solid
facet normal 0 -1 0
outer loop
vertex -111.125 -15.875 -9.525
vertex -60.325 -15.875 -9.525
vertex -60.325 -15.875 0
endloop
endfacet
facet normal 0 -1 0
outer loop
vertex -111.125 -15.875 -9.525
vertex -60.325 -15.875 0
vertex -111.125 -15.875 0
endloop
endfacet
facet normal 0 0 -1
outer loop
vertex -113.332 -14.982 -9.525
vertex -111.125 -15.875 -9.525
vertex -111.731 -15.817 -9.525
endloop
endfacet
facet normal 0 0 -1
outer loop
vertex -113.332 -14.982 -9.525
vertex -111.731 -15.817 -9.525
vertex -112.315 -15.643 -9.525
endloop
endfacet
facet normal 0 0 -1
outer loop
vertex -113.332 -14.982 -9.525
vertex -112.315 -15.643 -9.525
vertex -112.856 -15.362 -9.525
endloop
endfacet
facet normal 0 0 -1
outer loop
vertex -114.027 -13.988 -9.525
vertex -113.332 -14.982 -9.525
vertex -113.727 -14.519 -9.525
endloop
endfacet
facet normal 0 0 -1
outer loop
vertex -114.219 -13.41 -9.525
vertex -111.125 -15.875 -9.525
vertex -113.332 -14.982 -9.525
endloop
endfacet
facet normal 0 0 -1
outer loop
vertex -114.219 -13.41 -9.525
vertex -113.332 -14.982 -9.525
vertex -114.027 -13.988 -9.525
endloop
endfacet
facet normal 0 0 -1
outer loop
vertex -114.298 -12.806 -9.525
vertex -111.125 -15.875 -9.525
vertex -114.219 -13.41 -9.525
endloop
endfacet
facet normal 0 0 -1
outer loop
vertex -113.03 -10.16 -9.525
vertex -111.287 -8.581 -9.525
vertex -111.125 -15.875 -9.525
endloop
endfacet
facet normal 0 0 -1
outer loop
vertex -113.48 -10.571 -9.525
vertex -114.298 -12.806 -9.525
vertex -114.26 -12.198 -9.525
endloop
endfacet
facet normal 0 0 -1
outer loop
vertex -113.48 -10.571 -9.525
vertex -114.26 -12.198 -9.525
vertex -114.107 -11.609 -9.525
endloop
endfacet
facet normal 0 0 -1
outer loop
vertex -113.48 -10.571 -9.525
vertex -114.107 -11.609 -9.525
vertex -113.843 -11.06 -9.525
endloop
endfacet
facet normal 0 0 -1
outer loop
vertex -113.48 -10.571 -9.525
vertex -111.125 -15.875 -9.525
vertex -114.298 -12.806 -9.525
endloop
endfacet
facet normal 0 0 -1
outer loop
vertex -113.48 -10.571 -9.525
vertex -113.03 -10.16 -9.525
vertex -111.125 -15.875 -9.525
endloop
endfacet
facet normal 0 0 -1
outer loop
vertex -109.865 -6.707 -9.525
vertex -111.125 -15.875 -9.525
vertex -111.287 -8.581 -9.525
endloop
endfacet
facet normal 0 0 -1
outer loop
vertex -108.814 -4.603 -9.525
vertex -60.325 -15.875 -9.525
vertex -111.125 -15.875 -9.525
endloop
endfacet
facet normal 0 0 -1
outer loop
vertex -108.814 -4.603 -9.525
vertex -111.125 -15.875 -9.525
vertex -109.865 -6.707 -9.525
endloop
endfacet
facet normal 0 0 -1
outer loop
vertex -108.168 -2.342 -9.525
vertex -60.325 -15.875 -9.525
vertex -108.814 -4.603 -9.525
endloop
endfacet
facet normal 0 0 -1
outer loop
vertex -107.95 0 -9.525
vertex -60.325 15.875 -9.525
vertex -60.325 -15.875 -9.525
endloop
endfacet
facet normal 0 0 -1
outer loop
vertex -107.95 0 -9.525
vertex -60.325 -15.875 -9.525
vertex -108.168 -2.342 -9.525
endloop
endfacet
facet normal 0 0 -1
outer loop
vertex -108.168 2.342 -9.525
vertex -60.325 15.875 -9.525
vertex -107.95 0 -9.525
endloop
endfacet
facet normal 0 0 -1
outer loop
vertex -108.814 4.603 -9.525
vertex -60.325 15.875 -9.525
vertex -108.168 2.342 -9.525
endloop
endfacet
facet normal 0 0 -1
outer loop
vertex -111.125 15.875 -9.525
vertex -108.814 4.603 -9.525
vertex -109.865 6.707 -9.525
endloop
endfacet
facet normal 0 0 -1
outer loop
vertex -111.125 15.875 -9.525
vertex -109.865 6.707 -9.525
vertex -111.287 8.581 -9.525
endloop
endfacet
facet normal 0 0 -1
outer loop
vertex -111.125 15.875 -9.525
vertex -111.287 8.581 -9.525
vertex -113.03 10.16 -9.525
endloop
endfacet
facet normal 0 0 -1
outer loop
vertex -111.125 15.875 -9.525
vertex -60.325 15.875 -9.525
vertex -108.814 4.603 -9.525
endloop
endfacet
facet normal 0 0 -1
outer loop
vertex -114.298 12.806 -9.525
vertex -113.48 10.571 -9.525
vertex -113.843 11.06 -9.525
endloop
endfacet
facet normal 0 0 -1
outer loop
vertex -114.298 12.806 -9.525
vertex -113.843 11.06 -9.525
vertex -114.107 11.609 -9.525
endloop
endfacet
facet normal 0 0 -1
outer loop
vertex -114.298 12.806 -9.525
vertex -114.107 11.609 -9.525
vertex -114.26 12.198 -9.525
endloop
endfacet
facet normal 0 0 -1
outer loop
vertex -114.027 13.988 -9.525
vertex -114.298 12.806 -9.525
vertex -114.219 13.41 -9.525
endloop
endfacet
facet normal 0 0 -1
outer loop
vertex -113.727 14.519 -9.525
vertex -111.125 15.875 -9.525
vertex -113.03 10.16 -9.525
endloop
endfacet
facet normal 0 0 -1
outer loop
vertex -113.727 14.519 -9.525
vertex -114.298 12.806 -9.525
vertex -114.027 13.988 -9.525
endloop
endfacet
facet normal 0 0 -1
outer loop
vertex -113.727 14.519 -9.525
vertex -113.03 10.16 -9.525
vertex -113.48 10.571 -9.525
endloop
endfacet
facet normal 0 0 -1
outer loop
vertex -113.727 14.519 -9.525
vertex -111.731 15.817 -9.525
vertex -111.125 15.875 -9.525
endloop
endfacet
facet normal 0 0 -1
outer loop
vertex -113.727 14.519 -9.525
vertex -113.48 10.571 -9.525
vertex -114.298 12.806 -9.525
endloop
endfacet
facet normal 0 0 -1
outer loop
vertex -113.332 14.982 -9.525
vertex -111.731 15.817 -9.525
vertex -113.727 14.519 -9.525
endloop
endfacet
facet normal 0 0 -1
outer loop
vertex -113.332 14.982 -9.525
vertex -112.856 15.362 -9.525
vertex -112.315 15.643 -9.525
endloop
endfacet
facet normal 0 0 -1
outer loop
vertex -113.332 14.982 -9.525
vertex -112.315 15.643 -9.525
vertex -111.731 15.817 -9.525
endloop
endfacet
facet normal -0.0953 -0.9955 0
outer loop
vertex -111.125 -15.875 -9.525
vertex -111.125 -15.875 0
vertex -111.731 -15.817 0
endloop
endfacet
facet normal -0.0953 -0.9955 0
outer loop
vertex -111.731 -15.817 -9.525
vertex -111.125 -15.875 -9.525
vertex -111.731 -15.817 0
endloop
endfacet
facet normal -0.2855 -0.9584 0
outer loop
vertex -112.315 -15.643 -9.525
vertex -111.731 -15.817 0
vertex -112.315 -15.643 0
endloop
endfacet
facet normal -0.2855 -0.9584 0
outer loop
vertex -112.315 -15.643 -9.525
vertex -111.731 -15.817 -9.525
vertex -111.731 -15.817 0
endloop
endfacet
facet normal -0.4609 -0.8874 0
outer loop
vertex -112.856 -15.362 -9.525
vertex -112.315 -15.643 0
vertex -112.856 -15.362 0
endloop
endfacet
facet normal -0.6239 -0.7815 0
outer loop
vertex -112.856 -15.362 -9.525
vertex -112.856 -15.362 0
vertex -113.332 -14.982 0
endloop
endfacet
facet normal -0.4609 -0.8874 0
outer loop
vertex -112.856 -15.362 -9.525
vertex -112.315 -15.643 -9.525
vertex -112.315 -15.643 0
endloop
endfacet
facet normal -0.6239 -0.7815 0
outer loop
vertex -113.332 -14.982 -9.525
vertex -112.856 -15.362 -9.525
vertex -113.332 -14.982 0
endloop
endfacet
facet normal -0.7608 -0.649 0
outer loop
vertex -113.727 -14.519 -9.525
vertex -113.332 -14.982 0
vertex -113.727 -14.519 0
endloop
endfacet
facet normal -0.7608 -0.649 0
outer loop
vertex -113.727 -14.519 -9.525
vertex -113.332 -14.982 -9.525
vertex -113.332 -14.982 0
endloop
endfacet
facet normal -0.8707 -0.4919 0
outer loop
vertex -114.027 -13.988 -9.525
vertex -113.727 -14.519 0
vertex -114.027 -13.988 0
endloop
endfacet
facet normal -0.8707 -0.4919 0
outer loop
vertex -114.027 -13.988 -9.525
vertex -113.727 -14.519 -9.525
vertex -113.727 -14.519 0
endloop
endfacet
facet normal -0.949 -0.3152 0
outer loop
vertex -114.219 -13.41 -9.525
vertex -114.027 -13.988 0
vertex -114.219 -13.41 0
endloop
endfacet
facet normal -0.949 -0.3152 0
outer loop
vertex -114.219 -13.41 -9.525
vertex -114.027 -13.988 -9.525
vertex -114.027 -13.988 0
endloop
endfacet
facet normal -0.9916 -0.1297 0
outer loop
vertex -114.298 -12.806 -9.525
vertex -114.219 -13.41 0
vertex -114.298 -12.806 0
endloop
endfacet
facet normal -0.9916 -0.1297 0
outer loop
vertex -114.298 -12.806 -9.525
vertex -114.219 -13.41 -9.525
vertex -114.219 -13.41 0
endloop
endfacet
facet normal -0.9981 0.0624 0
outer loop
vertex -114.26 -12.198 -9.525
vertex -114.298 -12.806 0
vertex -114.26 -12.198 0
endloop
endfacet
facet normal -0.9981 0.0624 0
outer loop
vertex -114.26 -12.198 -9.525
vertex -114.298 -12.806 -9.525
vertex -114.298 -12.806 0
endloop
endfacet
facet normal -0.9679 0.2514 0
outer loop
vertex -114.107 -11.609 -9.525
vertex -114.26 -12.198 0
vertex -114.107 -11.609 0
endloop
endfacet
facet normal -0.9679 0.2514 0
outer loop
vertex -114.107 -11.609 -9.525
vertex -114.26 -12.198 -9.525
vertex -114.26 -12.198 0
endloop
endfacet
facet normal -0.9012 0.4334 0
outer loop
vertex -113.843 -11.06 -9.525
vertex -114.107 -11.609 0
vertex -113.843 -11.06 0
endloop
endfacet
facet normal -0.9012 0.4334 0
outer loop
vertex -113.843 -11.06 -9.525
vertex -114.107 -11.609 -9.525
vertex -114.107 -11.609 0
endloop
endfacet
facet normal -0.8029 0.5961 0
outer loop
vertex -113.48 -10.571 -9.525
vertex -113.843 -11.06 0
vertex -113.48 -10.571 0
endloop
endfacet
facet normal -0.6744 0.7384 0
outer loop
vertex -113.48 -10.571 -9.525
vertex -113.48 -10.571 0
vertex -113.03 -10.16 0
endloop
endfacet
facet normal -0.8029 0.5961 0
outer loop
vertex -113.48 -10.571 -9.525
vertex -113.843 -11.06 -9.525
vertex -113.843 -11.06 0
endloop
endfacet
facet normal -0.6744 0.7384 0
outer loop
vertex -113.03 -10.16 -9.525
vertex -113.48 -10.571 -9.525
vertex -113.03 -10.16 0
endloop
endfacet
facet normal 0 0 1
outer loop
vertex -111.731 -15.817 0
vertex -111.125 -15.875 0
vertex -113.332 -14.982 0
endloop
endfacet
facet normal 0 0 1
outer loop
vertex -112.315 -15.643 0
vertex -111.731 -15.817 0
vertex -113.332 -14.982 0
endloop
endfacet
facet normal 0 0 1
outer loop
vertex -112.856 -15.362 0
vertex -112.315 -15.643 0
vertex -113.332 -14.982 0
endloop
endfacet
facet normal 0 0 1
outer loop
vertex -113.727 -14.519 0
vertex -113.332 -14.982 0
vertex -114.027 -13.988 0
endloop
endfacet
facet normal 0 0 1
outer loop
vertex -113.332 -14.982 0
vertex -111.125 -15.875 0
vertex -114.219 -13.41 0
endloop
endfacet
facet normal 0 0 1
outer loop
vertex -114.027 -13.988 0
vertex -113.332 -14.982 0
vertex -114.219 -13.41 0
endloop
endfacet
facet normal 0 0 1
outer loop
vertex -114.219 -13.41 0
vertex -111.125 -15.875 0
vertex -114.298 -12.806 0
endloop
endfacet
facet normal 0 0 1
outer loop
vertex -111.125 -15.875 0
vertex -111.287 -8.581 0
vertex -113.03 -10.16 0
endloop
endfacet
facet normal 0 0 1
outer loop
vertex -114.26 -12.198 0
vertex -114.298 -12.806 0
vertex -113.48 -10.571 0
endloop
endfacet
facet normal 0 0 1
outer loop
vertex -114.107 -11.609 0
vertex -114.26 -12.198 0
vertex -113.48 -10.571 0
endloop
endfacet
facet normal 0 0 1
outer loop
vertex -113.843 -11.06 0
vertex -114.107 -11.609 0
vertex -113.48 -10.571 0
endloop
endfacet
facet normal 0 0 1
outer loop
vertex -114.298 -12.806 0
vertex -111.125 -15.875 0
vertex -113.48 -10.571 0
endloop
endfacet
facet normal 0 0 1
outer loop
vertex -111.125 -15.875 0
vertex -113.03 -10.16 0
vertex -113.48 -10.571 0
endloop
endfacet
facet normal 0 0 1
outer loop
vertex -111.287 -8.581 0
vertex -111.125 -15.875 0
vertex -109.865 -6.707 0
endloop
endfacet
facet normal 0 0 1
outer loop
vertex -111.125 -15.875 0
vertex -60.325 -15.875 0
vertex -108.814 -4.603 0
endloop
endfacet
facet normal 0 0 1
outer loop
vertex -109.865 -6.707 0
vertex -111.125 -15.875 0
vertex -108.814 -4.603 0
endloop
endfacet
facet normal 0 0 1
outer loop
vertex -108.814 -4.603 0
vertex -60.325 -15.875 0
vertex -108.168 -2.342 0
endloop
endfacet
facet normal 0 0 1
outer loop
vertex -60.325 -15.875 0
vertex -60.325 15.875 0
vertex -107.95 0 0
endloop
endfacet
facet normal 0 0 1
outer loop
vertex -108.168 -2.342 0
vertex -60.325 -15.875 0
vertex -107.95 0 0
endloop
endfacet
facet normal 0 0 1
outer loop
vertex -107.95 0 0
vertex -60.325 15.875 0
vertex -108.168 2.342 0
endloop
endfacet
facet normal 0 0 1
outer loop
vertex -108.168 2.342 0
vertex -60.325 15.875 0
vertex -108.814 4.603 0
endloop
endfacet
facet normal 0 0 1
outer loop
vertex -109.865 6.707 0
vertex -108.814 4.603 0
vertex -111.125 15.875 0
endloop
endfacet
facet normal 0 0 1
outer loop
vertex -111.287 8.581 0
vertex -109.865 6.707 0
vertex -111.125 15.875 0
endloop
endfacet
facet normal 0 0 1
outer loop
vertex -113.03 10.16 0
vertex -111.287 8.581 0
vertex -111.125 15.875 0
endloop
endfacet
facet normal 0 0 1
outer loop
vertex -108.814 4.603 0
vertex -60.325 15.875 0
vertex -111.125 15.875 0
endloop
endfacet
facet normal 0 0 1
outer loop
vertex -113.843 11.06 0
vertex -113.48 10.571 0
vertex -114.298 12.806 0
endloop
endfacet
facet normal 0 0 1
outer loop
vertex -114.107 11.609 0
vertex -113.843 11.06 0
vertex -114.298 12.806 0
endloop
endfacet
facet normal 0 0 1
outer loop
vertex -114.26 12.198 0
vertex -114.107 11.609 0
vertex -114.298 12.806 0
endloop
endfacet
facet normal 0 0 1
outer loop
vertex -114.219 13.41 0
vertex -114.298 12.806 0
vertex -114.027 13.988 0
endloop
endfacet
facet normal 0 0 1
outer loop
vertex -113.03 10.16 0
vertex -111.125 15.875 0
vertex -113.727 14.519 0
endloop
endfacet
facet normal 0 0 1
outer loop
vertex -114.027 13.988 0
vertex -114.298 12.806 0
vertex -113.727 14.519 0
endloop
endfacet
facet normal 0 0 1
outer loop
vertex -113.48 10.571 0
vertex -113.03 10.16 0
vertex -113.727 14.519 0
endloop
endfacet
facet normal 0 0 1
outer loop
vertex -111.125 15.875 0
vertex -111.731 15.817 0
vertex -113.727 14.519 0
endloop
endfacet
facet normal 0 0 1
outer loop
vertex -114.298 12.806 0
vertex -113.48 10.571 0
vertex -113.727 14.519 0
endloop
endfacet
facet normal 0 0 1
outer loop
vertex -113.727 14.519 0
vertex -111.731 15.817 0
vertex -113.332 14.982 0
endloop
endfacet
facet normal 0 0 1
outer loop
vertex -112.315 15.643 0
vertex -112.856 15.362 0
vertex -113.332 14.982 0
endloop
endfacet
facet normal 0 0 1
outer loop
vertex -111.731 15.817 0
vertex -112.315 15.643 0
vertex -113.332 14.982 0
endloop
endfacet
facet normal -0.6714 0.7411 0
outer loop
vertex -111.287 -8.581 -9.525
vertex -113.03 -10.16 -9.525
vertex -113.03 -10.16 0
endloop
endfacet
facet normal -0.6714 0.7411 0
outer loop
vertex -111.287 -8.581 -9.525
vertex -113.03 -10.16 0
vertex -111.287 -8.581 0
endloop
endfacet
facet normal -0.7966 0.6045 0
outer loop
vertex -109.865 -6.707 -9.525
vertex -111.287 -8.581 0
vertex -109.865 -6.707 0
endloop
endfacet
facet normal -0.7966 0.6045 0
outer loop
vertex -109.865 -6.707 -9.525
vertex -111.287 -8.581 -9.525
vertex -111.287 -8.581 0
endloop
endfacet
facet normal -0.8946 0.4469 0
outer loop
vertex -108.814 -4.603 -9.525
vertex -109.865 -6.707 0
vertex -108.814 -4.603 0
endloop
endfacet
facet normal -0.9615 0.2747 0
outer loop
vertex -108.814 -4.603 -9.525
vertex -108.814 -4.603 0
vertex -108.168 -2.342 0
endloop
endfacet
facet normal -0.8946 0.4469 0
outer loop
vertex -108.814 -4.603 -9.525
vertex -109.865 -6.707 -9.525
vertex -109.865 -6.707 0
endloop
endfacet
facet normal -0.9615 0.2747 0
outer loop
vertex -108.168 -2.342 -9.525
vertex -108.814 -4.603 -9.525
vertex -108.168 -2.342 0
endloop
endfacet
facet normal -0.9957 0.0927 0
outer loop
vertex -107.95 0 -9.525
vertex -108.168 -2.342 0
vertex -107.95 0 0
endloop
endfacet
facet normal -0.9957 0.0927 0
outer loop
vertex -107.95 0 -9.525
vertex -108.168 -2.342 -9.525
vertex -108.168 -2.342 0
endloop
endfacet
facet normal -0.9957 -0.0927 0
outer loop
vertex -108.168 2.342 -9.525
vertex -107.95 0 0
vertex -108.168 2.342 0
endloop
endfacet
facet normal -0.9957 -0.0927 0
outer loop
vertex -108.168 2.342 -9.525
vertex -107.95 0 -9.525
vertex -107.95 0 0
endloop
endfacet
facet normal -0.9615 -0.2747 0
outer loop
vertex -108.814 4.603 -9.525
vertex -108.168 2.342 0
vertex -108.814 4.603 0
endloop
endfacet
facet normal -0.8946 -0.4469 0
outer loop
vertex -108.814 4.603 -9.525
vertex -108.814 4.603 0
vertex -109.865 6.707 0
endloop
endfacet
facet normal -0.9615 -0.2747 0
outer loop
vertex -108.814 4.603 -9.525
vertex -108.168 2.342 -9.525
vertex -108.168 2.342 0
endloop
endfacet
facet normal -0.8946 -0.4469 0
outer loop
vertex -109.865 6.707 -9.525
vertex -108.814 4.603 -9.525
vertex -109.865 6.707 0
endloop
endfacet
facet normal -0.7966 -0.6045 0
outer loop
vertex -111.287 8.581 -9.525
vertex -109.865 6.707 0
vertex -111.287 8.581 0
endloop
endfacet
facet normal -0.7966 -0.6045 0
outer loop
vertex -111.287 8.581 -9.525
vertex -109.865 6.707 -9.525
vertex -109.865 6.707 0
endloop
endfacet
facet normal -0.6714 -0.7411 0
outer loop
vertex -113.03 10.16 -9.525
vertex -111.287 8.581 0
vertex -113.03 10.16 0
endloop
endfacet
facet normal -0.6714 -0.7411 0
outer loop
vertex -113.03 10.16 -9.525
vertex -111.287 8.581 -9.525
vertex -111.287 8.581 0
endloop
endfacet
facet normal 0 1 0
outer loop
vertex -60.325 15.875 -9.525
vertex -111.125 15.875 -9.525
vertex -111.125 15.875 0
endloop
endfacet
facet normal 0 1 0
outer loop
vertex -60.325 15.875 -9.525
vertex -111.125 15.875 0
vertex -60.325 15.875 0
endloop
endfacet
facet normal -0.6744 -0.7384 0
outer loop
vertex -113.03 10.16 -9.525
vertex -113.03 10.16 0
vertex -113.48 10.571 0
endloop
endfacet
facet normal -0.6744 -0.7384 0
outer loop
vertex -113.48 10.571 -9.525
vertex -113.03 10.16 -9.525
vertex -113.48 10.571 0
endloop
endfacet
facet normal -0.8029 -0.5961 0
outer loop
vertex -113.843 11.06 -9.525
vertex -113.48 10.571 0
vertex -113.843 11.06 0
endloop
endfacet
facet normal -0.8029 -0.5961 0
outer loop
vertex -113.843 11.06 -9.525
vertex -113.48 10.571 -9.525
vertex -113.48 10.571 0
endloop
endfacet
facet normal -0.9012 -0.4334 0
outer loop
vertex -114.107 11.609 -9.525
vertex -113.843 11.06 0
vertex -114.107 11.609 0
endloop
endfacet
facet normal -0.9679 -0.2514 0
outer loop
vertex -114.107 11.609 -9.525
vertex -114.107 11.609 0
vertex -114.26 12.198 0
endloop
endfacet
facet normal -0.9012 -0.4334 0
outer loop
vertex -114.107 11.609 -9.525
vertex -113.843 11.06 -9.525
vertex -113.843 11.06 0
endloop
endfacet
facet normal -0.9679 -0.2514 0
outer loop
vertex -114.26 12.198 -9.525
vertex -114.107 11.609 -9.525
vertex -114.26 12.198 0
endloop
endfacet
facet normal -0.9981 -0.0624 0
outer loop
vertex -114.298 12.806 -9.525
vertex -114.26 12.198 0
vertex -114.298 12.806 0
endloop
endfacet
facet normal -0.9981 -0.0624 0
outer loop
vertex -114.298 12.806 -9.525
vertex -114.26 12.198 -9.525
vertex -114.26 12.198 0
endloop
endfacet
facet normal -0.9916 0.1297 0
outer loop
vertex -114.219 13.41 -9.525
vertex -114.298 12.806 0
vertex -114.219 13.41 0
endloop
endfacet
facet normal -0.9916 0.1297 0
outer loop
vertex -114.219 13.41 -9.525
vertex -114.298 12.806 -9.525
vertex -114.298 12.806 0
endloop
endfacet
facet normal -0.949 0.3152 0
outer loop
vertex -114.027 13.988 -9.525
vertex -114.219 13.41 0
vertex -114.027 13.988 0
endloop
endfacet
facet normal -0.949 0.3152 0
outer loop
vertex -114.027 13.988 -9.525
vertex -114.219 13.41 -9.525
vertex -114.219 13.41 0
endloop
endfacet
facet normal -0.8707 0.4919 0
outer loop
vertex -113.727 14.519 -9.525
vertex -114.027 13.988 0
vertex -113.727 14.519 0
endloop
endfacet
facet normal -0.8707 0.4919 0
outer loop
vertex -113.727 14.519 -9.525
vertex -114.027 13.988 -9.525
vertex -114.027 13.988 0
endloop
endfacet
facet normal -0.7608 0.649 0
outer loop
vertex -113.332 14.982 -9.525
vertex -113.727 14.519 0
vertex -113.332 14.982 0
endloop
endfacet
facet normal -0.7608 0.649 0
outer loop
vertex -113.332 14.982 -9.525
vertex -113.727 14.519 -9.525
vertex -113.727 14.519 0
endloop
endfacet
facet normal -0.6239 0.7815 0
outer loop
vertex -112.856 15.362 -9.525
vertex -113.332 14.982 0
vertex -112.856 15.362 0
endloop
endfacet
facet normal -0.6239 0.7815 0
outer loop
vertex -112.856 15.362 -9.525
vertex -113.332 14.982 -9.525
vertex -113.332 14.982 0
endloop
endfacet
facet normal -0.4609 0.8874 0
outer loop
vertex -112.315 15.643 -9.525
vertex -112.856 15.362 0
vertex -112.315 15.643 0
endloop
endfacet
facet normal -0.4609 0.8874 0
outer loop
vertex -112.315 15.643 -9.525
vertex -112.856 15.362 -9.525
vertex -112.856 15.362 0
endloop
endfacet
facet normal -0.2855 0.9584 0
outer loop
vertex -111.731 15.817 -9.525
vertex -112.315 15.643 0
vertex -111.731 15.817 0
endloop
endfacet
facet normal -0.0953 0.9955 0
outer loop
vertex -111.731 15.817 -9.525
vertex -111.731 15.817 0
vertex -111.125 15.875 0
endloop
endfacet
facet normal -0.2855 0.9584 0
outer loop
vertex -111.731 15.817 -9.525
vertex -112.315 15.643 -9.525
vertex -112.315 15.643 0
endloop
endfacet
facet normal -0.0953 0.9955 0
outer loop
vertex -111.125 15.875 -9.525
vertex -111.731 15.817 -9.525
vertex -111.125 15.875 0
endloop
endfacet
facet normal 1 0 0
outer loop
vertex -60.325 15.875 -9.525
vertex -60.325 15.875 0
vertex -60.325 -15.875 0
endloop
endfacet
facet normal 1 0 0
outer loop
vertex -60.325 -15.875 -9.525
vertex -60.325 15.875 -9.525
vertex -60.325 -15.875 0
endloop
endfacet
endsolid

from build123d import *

# Parameters (mm, degrees)
BOSS_EXTRUDE1_DEPTH = 9.525
CAVITY1_START       = -9.525
CAVITY1_DEPTH       = 9.525


# Read off the part's stored shape, not the designer's step: Cavity1
with BuildPart() as part:
    # Sketch1 → Boss-Extrude1 (new body)
    with BuildSketch(Plane.XY):
        Polygon((-114.3, 19.05), (-60.325, 19.05), (-60.325, -19.05), (-114.3, -19.05), (-121.190985561, -19.05), (-111.454402918, 0), (-121.190985561, 19.05), align=None)
    extrude(amount=-BOSS_EXTRUDE1_DEPTH)

    # Cavity1 outline → Cavity1 (cut)
    with BuildSketch(Plane.XY.offset(CAVITY1_START)):
        with BuildLine():
            Line((-111.125, 15.875), (-60.325, 15.875))
            Line((-60.325, 15.875), (-60.325, 19.05))
            Line((-60.325, 19.05), (-121.190985561, 19.05))
            Line((-121.190985561, 19.05), (-111.454402918, 0))
            Line((-111.454402918, 0), (-121.190985561, -19.05))
            Line((-121.190985561, -19.05), (-60.325, -19.05))
            Line((-60.325, -19.05), (-60.325, -15.875))
            Line((-60.325, -15.875), (-111.125, -15.875))
            ThreePointArc((-111.125, -15.875), (-114.137069471, -13.704023157), (-113.03, -10.16))
            ThreePointArc((-113.03, -10.16), (-107.95, 0), (-113.03, 10.16))
            ThreePointArc((-113.03, 10.16), (-114.137069471, 13.704023157), (-111.125, 15.875))
        make_face()
    extrude(amount=CAVITY1_DEPTH, mode=Mode.SUBTRACT)


solid = part.part
